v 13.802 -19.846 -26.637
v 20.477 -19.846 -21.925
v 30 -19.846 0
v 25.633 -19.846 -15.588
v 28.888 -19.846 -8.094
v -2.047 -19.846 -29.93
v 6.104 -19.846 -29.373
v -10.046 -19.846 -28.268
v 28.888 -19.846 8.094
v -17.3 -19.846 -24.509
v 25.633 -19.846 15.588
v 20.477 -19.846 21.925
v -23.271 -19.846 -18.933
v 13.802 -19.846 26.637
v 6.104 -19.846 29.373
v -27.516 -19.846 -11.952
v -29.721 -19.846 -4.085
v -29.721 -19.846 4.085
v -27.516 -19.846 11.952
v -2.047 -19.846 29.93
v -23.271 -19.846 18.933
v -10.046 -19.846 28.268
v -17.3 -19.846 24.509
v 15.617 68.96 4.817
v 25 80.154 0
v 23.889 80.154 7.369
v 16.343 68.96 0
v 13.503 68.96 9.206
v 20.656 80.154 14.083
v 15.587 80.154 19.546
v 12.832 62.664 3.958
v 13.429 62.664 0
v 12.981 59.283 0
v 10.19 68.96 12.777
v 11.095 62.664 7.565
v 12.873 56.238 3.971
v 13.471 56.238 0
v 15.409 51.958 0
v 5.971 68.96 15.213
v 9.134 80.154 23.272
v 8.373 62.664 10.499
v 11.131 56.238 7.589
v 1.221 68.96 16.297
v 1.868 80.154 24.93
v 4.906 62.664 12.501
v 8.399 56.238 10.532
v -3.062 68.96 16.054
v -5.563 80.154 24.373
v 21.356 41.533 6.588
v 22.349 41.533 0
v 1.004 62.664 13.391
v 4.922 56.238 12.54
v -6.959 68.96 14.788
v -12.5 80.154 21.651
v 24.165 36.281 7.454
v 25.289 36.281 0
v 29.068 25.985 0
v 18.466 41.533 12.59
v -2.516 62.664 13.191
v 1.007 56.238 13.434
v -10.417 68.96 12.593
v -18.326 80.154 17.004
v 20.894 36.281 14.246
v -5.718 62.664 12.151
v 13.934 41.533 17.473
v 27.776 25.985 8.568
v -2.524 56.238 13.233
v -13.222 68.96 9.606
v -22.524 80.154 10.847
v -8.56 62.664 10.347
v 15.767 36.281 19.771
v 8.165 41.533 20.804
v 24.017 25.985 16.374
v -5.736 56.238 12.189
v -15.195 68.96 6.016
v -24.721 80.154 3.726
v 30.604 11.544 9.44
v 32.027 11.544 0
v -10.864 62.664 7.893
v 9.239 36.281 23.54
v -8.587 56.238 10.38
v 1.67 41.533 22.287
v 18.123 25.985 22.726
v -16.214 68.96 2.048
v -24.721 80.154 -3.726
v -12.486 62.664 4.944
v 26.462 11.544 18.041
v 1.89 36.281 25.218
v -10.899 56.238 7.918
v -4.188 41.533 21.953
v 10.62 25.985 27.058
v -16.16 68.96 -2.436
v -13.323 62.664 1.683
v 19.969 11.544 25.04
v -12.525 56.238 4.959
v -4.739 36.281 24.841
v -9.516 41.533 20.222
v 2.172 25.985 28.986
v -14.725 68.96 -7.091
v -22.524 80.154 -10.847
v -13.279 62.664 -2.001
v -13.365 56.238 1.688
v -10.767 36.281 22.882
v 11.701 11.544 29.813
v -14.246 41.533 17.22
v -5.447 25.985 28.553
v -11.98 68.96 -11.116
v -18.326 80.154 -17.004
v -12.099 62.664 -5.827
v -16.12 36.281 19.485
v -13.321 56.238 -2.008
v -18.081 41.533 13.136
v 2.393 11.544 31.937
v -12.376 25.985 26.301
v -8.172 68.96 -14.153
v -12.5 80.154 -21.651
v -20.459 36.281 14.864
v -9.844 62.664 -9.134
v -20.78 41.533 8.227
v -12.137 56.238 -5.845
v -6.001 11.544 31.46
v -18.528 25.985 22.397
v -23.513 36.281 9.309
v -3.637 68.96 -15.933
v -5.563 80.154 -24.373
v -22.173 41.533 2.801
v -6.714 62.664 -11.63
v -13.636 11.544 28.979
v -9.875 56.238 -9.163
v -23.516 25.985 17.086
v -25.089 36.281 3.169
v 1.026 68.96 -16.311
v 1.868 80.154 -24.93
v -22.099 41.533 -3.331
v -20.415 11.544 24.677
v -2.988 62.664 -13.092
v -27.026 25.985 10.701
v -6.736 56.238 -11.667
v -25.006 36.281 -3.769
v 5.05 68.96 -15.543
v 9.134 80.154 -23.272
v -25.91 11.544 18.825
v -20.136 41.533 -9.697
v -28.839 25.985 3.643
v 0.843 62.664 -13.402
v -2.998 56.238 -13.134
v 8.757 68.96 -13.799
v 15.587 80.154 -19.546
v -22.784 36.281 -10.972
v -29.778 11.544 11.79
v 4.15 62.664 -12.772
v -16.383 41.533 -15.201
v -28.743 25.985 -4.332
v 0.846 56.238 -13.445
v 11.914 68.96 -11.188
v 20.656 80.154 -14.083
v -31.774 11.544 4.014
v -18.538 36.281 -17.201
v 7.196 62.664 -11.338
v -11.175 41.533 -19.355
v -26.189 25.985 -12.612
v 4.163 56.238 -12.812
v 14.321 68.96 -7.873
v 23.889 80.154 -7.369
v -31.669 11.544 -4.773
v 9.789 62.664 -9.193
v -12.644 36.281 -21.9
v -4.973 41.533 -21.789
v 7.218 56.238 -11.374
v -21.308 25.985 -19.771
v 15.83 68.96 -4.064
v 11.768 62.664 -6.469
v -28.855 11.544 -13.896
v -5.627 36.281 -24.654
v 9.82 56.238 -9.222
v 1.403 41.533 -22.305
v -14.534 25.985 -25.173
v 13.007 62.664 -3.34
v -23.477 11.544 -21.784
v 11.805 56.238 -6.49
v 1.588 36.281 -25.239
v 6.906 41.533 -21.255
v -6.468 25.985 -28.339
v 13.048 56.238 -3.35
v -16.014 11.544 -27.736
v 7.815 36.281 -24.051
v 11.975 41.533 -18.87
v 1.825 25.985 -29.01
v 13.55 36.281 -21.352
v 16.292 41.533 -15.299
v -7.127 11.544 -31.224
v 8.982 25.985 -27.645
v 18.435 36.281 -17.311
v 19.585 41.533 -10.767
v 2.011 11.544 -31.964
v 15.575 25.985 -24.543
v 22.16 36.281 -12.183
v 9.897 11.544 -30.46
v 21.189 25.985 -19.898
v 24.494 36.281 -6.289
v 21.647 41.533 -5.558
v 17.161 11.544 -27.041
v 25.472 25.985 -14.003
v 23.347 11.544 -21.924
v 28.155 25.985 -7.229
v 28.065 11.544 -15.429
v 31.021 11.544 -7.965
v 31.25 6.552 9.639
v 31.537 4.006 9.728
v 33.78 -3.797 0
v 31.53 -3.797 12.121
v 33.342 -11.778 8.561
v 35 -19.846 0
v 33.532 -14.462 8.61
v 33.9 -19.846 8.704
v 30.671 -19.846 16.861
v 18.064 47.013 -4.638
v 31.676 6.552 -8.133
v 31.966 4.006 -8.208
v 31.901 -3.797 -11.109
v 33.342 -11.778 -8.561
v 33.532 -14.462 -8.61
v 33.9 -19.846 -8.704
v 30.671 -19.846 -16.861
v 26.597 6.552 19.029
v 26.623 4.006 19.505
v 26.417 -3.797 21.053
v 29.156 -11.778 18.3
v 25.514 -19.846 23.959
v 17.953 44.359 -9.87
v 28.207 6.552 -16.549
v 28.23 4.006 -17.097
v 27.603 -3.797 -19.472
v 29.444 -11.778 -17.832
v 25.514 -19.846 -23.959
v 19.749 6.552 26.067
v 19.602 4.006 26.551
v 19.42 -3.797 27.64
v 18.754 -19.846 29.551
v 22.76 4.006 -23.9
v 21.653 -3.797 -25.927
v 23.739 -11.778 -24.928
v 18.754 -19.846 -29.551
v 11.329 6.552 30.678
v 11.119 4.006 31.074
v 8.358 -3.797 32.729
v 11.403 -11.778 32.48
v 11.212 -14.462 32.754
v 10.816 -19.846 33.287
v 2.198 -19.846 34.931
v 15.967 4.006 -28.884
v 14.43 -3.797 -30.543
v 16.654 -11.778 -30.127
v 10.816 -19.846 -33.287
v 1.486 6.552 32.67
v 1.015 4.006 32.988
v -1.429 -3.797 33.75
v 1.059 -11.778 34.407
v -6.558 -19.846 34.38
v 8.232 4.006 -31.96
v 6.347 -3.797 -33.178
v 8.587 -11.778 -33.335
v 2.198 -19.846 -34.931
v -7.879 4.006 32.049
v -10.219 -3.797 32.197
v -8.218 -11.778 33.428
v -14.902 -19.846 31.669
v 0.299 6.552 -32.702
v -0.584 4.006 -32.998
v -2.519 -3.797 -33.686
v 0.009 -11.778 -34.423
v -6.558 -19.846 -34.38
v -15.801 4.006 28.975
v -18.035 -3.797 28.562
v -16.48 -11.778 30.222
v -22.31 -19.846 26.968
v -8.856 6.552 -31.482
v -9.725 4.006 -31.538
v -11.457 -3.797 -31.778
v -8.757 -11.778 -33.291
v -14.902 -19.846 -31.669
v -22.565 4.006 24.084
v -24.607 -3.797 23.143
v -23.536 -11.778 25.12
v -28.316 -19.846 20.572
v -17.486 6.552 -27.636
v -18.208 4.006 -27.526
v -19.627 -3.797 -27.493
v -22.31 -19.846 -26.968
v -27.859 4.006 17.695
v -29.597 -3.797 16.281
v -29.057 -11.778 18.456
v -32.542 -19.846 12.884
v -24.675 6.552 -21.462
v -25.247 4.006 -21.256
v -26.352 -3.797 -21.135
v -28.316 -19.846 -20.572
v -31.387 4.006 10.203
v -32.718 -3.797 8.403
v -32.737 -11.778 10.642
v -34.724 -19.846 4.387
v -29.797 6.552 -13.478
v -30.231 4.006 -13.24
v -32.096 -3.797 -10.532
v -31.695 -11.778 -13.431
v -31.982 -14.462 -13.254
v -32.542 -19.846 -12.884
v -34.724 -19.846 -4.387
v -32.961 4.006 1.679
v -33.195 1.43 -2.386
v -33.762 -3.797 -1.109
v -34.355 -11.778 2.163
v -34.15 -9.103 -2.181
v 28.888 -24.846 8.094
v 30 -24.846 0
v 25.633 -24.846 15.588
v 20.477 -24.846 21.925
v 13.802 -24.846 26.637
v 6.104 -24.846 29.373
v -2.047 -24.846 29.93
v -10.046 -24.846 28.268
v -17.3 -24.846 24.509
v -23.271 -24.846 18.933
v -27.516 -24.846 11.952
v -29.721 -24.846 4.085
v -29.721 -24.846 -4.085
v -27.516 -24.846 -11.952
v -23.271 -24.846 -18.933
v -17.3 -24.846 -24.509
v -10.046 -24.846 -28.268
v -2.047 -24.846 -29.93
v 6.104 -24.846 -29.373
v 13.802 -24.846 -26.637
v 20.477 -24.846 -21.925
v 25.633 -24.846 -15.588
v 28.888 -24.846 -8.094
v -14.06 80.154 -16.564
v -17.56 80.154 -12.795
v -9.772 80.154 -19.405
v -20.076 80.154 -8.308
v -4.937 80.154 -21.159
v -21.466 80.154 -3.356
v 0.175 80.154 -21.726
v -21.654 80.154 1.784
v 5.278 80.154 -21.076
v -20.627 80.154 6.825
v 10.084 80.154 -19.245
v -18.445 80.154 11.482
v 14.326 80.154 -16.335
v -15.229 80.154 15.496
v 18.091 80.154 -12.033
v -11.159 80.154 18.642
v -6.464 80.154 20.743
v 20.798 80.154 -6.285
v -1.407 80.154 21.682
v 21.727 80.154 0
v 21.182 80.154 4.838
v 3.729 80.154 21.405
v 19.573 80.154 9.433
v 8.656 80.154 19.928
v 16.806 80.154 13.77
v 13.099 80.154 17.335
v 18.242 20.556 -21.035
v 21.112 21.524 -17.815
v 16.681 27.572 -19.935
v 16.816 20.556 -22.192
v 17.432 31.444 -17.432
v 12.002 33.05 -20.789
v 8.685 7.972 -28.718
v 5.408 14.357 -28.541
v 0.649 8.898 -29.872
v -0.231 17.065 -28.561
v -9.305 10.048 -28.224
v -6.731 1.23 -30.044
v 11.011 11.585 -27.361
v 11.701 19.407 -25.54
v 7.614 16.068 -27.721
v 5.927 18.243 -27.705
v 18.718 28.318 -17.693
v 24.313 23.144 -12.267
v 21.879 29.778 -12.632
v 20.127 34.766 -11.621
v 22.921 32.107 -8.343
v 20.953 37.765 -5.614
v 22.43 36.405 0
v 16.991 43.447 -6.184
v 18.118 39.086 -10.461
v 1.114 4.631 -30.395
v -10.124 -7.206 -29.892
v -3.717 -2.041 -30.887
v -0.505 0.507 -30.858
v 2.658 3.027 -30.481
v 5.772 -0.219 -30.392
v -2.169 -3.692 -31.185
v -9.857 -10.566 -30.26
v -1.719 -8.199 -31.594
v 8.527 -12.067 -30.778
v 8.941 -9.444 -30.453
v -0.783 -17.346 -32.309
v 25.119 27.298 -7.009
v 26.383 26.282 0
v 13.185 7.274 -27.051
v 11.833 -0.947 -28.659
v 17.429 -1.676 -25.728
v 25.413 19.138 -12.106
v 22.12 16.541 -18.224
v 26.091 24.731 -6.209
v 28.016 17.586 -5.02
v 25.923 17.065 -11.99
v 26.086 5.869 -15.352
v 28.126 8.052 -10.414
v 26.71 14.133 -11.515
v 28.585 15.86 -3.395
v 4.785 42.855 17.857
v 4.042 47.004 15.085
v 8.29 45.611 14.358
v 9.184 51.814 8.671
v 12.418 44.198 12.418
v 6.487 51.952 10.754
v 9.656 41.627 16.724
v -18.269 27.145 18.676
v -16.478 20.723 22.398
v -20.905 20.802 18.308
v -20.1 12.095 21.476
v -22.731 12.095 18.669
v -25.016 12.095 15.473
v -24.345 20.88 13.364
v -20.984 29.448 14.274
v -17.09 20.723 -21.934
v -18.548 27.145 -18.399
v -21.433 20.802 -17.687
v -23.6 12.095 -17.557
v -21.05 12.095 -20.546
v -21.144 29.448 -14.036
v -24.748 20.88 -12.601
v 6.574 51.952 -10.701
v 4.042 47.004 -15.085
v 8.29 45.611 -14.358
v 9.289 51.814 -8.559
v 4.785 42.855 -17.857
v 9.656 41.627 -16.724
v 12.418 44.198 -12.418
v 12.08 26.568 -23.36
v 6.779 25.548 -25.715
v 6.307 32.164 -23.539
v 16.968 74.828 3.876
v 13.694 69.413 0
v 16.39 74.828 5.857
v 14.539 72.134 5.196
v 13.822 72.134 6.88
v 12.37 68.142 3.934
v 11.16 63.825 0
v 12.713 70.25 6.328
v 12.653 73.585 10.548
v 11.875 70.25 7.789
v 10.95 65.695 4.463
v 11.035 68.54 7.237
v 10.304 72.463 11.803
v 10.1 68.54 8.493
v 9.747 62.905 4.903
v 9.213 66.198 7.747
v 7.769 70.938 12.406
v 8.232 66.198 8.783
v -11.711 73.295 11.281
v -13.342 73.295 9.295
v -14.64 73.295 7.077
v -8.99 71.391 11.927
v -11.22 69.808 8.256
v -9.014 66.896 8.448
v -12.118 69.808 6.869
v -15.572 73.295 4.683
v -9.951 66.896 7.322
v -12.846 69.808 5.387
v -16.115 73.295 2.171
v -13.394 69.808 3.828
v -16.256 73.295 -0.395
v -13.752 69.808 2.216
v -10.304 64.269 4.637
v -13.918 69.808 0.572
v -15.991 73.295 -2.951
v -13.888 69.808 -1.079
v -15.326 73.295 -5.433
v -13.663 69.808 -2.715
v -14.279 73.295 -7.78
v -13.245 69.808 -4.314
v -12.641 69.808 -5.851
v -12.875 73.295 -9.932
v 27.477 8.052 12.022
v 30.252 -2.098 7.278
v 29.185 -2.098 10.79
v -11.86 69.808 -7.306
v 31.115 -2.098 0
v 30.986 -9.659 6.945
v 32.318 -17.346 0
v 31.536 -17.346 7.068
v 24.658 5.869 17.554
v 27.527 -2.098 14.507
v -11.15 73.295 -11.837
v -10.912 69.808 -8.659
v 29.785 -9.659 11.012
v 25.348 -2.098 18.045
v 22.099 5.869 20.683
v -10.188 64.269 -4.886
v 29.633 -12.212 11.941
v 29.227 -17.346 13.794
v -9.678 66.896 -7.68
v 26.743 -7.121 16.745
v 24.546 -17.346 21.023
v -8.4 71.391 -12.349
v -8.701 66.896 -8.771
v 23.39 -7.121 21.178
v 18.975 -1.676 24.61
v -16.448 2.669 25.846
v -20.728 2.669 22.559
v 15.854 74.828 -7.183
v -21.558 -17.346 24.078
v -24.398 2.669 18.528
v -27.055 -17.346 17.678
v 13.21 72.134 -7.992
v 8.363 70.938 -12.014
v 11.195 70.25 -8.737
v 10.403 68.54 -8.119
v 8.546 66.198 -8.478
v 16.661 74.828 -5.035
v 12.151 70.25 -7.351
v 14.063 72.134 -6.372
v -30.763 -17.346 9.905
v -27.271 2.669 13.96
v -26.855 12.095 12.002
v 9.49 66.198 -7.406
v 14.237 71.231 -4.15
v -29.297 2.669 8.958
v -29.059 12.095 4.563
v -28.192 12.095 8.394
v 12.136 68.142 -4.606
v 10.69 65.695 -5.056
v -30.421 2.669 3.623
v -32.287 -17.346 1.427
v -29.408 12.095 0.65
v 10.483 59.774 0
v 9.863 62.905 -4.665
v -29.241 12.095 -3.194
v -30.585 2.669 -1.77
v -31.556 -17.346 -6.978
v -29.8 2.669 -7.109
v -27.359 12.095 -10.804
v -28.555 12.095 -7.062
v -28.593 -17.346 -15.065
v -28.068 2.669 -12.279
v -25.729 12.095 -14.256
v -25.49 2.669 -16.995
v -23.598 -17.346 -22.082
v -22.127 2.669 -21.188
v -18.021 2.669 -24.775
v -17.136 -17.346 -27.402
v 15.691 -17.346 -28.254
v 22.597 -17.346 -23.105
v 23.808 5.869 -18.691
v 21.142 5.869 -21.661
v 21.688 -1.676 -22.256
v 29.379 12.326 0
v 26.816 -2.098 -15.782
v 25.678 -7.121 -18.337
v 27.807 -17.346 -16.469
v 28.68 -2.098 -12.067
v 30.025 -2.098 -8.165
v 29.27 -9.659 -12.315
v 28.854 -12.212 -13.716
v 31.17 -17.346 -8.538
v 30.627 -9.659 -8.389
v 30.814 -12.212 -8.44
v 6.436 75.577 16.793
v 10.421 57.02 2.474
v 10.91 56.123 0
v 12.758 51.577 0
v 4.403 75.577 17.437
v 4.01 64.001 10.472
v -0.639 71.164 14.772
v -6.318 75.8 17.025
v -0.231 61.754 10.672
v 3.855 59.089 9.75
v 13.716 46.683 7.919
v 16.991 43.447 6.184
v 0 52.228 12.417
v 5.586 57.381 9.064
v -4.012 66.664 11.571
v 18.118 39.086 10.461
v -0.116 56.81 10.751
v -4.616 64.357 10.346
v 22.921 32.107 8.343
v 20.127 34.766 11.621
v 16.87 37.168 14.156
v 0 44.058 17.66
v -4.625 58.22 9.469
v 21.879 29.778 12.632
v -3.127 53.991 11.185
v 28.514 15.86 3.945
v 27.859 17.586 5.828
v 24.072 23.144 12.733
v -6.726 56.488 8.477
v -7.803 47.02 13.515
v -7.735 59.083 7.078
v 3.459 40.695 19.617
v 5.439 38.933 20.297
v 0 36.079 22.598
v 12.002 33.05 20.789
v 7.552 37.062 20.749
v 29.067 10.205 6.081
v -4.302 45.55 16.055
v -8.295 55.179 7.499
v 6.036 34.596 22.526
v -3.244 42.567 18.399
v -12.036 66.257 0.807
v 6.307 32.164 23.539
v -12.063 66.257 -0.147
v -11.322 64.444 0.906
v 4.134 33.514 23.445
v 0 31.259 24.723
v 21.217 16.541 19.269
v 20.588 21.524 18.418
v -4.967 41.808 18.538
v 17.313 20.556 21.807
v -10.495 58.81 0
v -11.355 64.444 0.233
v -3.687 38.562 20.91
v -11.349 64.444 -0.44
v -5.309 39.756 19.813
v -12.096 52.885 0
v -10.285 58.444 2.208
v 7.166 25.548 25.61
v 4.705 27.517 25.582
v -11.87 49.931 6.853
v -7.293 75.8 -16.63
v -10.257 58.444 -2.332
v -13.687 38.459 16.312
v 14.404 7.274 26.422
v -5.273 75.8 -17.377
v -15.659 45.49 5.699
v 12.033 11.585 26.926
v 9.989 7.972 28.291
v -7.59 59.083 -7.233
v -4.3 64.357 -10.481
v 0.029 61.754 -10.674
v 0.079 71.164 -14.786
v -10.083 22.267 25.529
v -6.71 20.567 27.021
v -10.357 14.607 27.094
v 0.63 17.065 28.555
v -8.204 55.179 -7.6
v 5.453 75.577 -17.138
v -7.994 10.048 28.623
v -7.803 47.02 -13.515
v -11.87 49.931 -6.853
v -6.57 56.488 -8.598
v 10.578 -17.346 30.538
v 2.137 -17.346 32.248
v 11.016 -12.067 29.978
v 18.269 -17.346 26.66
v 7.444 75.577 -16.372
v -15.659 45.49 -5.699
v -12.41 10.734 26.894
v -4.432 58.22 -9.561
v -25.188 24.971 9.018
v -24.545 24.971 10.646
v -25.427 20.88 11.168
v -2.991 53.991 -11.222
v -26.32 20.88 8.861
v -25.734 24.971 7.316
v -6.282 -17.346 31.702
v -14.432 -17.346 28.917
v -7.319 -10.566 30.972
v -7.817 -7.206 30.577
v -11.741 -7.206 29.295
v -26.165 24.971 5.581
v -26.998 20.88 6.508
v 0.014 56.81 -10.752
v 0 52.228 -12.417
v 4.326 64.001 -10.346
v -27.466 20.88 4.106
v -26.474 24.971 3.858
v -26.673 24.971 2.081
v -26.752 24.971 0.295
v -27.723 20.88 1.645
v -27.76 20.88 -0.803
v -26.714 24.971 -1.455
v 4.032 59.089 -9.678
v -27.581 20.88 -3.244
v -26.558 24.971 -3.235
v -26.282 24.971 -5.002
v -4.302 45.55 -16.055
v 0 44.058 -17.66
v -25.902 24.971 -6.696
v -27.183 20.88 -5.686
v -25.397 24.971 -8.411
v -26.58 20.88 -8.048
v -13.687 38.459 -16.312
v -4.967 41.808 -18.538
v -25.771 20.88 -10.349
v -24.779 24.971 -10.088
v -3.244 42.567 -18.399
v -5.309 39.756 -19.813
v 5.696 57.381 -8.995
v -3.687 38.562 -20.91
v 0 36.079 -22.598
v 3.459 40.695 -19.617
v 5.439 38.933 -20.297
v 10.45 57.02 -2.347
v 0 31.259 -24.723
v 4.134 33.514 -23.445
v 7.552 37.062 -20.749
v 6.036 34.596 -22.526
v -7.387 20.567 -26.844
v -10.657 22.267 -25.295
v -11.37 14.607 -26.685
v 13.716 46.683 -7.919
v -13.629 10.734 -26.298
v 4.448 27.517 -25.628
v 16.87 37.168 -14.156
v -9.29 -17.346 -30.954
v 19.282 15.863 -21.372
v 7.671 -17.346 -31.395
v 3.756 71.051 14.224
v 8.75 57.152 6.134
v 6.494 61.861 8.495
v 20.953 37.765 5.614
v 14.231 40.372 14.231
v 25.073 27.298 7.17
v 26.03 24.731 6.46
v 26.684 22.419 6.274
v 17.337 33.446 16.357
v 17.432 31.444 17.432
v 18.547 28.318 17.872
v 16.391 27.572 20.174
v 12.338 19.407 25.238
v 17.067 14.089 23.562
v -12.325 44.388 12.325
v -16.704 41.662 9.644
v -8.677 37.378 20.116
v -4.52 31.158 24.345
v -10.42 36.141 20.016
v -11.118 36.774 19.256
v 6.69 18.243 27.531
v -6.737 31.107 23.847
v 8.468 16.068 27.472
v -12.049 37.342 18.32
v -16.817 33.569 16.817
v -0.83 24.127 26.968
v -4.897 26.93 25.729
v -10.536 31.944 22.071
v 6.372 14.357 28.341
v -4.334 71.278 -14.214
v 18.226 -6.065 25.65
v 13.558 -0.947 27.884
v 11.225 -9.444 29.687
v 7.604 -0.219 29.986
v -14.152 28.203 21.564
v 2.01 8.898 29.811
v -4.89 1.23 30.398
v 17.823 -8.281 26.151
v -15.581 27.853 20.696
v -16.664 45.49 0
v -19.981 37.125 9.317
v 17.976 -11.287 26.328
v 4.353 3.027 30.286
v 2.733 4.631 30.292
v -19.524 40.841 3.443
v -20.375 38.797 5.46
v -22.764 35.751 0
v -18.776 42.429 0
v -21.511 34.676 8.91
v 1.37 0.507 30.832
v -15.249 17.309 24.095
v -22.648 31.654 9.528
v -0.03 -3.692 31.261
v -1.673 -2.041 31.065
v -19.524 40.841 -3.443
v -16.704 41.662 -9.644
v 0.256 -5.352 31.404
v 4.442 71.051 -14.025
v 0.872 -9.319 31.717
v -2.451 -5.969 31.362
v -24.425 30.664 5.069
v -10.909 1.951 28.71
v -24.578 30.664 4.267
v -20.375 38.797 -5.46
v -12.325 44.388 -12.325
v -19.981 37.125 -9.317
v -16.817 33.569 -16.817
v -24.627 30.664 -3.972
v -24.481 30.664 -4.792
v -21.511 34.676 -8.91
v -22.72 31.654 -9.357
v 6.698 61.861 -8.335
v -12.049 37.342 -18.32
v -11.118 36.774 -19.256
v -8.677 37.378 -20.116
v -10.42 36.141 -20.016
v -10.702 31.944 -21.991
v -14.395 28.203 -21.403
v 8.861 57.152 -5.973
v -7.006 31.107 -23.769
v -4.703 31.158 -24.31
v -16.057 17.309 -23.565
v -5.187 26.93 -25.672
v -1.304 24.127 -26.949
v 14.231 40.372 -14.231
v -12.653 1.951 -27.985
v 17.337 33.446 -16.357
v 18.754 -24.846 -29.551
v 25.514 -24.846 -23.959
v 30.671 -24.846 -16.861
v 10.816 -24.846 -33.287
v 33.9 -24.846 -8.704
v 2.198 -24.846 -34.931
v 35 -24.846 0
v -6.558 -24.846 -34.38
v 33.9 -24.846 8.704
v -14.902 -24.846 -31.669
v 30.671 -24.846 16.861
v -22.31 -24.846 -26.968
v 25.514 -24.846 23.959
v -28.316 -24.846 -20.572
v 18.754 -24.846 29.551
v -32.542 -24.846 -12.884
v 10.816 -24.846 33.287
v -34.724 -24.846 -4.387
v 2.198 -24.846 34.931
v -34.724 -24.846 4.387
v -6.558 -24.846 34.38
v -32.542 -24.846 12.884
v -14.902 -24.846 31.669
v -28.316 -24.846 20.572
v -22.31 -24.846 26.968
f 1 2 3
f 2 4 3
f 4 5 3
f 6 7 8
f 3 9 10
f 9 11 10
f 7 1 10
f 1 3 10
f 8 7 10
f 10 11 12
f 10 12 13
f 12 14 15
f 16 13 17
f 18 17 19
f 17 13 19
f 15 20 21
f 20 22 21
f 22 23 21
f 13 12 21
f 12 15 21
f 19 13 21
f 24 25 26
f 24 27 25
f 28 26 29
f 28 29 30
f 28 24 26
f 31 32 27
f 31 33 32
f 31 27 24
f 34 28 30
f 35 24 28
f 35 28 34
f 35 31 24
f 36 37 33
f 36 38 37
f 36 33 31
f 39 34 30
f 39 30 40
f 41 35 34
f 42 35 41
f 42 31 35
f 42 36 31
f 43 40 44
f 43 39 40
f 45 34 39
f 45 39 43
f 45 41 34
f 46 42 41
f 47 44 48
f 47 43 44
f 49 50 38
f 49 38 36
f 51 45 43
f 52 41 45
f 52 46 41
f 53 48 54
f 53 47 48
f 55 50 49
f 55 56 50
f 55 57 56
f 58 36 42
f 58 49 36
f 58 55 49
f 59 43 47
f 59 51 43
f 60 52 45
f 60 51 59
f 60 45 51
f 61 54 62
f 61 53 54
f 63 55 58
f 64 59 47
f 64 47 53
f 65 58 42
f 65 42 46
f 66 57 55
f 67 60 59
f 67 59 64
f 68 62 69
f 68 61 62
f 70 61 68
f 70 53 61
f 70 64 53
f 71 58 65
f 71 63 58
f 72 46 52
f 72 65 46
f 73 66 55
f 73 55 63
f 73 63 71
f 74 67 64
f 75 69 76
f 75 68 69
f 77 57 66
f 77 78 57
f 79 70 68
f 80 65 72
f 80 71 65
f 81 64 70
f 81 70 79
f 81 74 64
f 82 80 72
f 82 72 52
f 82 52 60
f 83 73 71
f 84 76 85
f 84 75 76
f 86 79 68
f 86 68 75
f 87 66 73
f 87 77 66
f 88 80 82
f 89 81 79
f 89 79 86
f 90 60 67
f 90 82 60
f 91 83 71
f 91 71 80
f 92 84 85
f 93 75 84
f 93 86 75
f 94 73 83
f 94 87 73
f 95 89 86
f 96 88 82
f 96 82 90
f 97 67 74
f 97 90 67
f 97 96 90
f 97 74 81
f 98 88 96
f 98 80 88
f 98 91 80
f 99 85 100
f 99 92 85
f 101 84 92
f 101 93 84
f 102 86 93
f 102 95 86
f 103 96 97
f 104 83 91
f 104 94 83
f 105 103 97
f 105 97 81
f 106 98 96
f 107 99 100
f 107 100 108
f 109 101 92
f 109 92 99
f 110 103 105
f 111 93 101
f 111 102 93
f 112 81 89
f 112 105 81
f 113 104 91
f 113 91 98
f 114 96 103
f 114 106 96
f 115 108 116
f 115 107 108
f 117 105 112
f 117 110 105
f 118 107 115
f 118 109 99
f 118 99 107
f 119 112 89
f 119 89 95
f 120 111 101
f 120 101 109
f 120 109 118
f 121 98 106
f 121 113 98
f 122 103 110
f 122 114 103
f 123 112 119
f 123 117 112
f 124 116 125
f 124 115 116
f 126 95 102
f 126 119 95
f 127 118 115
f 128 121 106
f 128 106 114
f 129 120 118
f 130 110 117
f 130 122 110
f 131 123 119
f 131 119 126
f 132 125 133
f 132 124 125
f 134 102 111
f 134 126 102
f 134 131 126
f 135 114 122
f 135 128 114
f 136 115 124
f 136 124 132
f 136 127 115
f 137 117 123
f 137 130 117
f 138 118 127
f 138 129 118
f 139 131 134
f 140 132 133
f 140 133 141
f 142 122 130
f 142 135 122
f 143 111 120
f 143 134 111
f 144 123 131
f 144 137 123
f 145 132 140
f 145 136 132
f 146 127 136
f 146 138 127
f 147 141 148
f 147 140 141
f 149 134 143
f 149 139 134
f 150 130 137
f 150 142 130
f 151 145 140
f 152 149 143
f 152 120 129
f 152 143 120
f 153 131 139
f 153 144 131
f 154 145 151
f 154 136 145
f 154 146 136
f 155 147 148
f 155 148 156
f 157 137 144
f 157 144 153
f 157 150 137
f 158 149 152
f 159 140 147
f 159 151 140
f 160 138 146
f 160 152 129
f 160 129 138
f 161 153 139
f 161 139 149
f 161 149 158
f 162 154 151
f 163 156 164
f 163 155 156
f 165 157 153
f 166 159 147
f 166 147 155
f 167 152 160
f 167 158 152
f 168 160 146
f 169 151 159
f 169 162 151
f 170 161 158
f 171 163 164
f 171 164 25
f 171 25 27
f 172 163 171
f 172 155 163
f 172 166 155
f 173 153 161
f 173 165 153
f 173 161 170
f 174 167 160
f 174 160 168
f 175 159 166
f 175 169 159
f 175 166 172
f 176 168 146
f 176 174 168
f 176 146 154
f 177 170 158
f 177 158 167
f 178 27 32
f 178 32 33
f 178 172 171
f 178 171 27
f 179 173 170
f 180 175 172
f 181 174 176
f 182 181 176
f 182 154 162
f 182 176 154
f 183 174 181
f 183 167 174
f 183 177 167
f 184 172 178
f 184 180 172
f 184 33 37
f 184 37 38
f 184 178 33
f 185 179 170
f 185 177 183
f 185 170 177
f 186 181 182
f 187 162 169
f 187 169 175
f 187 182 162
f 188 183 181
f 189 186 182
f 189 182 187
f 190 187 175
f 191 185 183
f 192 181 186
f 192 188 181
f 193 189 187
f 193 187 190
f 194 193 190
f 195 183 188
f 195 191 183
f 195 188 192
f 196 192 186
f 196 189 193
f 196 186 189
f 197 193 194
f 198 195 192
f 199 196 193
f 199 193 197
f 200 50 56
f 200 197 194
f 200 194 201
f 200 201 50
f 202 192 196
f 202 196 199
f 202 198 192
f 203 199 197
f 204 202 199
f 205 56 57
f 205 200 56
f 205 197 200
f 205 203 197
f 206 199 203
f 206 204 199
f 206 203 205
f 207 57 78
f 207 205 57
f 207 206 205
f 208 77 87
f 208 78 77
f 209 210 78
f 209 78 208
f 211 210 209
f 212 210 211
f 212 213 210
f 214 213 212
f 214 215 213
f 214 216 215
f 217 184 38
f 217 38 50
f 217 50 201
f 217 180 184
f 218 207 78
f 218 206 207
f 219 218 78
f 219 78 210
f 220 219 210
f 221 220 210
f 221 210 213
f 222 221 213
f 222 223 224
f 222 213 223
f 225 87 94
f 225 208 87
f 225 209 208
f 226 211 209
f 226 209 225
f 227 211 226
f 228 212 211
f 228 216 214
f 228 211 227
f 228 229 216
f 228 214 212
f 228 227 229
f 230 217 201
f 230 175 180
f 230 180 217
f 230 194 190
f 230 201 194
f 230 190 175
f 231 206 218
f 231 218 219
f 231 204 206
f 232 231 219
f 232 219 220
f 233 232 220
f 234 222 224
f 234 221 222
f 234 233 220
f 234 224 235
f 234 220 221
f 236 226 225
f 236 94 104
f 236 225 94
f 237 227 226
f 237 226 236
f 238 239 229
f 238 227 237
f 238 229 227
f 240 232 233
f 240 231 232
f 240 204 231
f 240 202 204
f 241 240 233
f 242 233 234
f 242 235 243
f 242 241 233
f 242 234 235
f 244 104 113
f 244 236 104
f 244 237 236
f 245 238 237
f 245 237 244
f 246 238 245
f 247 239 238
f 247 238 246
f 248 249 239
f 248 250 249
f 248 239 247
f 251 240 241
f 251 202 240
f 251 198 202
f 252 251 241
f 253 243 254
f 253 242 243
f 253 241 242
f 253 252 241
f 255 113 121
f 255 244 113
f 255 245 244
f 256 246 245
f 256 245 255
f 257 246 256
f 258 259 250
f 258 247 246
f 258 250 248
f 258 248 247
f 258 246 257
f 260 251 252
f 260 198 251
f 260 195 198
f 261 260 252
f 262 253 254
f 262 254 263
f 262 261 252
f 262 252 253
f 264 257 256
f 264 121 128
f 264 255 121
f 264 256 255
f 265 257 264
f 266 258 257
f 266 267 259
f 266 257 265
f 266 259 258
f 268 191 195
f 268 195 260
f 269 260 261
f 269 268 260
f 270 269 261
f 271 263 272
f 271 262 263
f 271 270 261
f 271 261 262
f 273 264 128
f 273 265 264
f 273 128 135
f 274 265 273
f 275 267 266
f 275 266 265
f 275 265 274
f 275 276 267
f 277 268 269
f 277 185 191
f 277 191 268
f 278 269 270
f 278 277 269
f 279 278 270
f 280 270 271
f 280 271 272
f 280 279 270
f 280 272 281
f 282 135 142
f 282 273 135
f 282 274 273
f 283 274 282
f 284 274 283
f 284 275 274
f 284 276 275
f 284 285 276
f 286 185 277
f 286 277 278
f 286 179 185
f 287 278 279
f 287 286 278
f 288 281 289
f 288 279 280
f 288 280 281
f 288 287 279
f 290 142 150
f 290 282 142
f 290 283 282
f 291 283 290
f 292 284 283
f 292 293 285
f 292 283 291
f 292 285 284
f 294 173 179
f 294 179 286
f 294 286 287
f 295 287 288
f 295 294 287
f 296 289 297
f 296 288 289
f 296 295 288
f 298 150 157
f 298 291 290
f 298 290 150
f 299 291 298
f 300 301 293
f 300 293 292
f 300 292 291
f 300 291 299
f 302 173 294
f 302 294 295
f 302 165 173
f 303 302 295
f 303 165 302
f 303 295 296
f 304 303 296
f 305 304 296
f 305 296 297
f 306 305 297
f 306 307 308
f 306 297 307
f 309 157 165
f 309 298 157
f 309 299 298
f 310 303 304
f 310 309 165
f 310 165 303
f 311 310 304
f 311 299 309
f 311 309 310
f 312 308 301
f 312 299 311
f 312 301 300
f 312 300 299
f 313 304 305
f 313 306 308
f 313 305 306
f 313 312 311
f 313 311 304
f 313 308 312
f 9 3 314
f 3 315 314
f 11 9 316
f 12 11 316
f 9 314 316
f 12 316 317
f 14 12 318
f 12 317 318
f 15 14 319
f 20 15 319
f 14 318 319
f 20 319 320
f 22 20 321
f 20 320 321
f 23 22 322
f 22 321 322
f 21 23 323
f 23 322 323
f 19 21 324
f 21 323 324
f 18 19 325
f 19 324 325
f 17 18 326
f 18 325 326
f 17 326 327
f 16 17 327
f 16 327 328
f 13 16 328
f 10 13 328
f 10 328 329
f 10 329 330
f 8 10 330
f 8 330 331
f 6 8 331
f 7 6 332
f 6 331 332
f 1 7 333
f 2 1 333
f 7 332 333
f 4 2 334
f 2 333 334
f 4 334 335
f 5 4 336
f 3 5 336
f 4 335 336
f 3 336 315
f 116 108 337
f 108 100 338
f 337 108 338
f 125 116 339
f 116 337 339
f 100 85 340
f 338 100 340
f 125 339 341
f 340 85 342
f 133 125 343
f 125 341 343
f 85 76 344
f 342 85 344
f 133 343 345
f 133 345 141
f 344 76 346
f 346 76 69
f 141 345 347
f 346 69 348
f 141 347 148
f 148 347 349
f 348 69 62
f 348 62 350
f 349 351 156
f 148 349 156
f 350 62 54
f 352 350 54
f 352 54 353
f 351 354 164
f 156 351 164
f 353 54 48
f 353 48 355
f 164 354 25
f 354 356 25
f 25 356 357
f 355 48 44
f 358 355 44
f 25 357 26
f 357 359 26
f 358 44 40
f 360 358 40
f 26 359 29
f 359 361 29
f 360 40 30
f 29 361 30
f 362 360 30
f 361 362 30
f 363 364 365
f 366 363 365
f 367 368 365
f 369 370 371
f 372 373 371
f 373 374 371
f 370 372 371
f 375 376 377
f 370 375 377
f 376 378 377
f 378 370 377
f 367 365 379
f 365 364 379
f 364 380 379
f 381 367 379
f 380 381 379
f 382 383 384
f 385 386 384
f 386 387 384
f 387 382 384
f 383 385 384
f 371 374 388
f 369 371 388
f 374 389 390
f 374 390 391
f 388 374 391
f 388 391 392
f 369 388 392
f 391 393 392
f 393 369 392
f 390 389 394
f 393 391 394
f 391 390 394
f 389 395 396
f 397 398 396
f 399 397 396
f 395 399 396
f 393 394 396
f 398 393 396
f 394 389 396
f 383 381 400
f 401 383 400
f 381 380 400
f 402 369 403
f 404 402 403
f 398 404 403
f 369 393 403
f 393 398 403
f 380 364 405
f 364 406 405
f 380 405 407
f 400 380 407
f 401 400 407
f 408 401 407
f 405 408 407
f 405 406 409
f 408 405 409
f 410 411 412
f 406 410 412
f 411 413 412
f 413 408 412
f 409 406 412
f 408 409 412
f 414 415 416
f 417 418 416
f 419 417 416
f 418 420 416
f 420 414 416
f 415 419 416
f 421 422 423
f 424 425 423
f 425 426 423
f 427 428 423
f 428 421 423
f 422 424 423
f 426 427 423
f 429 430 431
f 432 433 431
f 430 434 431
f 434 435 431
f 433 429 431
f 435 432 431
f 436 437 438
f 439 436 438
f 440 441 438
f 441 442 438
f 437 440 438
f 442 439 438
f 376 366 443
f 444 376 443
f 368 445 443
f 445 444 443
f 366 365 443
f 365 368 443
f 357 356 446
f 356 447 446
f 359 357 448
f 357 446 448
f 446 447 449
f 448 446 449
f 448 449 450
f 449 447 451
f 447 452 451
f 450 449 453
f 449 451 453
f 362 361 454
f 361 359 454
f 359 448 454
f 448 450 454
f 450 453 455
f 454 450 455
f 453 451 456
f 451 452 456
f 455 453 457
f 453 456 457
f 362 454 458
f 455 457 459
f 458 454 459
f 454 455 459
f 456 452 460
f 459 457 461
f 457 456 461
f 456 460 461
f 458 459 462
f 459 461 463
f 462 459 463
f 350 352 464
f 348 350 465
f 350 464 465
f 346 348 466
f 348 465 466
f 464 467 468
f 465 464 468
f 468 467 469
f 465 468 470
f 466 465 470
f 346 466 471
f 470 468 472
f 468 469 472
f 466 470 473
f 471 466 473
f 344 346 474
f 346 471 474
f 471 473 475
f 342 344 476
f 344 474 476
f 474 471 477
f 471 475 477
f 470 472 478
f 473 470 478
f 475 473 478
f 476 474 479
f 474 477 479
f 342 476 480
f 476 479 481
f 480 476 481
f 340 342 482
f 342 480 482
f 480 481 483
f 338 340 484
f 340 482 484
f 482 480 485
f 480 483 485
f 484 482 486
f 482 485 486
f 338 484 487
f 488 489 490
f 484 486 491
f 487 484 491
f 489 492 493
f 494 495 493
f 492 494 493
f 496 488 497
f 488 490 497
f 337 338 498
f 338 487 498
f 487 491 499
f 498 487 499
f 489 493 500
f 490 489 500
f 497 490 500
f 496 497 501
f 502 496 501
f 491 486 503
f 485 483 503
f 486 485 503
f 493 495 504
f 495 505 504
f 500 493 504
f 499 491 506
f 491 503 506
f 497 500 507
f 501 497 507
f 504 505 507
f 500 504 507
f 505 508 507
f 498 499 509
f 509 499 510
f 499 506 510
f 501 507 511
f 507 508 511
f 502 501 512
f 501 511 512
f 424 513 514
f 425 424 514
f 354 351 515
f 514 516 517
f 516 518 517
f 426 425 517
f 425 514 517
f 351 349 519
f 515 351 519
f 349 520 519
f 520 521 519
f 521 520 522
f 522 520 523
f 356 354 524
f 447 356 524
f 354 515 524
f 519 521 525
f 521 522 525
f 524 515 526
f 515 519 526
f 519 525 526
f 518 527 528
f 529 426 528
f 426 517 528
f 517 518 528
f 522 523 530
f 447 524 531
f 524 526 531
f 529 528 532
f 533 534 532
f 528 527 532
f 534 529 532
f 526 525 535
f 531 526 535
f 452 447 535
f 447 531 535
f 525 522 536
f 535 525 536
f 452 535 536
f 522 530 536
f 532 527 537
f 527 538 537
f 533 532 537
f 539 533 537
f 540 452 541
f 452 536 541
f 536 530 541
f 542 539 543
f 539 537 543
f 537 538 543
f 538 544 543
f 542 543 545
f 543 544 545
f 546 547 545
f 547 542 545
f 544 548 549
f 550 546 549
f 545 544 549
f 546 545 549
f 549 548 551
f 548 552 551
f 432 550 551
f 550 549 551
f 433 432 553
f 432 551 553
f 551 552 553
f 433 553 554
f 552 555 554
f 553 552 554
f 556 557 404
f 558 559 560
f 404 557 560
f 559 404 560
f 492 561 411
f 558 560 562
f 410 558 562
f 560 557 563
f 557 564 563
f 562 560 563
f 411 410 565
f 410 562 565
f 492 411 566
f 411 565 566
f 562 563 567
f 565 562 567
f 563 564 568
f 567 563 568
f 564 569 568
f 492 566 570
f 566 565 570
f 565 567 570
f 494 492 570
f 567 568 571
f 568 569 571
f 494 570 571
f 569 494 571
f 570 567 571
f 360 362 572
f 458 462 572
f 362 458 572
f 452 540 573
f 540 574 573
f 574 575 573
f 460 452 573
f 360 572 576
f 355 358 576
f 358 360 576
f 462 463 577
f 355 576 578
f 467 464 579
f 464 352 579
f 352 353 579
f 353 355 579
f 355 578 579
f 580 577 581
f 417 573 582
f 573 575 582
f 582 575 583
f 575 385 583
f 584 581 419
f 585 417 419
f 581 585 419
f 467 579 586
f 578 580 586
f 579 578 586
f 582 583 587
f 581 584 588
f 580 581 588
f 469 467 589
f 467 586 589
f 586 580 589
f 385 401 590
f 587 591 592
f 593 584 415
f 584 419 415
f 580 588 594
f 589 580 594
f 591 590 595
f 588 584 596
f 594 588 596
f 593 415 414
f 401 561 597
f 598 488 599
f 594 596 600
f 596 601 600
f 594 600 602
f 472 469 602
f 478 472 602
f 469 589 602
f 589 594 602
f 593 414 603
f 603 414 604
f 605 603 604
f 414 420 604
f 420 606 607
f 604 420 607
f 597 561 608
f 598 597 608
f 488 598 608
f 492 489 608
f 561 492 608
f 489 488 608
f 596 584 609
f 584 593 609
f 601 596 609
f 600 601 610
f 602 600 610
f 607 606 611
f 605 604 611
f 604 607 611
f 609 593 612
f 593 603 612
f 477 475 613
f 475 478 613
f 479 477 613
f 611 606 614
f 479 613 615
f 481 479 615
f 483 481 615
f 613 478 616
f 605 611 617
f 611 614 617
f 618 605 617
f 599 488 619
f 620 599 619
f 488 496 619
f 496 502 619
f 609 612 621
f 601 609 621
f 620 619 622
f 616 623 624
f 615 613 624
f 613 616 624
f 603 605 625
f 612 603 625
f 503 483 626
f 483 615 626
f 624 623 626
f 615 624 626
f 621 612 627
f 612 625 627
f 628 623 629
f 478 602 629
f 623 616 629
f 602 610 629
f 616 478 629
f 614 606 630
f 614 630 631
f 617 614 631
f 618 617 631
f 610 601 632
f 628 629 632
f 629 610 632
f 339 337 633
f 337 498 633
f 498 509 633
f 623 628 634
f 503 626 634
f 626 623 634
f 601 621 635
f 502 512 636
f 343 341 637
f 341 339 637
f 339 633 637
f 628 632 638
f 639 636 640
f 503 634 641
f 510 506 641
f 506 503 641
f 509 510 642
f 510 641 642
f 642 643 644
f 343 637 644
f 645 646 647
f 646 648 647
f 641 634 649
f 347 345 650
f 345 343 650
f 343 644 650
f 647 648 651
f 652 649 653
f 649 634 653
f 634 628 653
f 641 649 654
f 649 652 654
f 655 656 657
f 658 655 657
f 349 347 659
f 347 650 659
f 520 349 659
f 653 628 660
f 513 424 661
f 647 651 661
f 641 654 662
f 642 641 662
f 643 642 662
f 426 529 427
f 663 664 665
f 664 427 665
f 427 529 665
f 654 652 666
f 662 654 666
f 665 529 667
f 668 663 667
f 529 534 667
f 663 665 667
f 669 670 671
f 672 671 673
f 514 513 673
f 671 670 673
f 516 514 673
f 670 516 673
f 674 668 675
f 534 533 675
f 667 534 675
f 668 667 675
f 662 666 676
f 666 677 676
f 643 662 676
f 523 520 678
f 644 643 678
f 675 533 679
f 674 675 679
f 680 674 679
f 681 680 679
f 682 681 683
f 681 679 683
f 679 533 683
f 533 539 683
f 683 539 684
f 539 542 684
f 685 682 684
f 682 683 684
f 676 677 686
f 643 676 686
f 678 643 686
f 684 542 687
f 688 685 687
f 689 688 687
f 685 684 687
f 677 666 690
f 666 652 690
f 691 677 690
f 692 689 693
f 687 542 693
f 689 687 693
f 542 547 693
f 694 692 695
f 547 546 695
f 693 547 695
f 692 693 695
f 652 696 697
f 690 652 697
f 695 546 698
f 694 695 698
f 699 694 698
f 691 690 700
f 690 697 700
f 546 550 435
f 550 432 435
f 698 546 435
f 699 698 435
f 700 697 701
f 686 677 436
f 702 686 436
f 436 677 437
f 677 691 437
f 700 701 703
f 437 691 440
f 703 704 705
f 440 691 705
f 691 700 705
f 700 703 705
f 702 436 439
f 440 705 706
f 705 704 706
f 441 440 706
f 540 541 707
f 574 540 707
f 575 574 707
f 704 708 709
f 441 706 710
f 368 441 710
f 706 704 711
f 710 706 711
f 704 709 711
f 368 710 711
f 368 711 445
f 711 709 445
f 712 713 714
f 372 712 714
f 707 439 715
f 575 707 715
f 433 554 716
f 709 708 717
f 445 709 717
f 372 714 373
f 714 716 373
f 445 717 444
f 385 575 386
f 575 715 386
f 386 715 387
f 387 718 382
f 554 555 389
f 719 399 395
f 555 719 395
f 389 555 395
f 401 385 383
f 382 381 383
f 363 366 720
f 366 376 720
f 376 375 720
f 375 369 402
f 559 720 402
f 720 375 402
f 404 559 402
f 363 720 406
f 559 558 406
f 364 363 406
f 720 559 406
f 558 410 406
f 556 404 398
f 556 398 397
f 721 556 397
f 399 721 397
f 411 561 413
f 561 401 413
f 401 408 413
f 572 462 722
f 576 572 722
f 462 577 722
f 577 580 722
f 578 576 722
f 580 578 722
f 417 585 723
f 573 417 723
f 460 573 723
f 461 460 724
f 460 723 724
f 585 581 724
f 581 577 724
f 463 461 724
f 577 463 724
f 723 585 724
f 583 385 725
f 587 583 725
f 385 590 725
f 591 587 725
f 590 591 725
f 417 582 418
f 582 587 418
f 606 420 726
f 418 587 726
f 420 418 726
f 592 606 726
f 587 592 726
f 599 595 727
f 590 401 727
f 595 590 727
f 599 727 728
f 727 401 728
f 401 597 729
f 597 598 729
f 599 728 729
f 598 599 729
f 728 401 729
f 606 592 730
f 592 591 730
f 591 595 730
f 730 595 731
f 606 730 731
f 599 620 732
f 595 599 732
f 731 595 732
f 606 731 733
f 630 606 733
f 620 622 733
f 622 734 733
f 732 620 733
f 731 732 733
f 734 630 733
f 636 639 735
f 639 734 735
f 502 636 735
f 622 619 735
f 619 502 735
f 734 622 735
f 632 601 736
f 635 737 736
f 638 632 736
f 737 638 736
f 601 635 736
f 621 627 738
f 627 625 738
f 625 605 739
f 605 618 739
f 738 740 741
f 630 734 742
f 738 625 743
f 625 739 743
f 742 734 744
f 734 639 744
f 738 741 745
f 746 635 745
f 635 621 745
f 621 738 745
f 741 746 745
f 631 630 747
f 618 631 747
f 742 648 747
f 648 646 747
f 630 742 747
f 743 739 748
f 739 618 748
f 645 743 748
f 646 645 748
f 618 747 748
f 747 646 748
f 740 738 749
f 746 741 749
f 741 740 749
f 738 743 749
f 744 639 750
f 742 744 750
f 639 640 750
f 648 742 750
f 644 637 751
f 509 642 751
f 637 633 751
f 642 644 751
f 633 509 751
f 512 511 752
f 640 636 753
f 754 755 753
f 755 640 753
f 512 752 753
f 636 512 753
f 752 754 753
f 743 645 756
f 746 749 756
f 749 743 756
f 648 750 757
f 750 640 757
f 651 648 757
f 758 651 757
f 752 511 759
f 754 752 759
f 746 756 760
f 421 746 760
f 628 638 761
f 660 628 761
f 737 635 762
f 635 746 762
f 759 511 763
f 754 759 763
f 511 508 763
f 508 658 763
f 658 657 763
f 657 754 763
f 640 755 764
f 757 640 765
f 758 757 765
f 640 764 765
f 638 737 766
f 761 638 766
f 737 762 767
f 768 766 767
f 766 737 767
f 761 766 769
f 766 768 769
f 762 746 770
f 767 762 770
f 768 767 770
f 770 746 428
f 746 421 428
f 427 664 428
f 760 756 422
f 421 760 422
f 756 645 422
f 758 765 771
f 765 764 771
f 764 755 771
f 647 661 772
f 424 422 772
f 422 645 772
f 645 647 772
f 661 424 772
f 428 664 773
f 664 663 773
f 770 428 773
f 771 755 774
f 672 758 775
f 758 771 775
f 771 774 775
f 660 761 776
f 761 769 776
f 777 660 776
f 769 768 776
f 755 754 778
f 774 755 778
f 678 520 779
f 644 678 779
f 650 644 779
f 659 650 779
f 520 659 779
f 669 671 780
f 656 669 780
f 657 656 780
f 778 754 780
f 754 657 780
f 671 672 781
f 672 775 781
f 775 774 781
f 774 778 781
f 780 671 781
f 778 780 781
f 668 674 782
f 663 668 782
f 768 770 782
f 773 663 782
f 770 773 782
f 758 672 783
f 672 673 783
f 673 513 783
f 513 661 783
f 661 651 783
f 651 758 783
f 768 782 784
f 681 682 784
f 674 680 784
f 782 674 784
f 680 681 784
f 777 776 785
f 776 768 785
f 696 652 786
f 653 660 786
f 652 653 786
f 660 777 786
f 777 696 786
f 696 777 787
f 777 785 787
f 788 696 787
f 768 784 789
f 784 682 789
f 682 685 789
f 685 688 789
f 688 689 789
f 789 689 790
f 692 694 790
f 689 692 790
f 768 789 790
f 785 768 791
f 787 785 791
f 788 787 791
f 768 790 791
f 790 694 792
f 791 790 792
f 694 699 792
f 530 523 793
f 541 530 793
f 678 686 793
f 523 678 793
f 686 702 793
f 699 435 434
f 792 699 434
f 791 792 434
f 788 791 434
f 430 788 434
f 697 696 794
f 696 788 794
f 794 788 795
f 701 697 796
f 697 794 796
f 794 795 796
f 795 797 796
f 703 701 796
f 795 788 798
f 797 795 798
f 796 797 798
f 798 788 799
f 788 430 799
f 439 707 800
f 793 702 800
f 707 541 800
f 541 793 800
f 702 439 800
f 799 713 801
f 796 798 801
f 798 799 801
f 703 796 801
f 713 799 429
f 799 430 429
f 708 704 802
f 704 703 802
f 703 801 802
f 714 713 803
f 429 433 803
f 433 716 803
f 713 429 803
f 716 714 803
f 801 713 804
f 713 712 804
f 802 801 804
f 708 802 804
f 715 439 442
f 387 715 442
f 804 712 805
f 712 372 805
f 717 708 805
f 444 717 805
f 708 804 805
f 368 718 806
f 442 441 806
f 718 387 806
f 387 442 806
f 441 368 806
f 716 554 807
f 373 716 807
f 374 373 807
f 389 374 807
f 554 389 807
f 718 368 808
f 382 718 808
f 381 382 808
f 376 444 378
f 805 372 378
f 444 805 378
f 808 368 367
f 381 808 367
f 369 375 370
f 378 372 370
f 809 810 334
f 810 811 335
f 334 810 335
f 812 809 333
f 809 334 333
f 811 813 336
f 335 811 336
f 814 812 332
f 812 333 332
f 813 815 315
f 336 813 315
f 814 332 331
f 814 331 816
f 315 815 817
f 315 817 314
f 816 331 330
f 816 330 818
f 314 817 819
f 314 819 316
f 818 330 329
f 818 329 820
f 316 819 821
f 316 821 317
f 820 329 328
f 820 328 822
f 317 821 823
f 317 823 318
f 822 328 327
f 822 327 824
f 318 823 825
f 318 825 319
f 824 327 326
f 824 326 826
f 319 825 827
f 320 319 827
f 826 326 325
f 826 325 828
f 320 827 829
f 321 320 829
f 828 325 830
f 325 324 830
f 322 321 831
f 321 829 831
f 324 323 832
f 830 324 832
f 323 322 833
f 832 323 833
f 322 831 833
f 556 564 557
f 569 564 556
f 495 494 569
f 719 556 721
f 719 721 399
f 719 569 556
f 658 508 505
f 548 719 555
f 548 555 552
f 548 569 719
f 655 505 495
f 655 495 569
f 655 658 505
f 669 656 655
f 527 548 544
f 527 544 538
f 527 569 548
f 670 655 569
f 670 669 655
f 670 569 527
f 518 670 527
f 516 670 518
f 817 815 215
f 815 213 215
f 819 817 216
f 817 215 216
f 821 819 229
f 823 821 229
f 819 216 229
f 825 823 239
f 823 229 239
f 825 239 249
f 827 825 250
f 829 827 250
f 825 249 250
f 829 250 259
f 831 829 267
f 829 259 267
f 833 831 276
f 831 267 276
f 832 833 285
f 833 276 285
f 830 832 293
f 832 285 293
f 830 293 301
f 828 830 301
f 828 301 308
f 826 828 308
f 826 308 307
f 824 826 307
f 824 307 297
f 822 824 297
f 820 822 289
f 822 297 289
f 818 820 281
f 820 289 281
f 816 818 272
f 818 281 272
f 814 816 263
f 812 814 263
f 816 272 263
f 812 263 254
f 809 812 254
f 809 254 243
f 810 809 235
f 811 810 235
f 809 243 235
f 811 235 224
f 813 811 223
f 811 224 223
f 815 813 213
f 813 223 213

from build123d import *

# Parameters (mm, degrees)
F2_T = -2.5


with BuildPart() as f1:
    # F0 (on Top) → F1 (revolve)
    with BuildSketch(Plane.XY):
        with BuildLine():
            add(Edge.make_bspline(
                [(25, 80.1539123058), (18.8296563793, 72.8638140322), (6.3958253179, 58.1735705177), (31.0256389858, 36.9451326056), (33.5061450744, 1.5001976258), (35, -19.8460876942)],
                knots=[0, 0, 0, 0, 0.2815302014, 0.5673102145, 1, 1, 1, 1], degree=3))
            Line((25, 80.1539123058), (0, 80.1539123058))
            Line((0, 80.1539123058), (0, -19.8460876942))
            Line((0, -19.8460876942), (30, -19.8460876942))
            Line((30, -19.8460876942), (30, -24.8460876942))
            Line((30, -24.8460876942), (35, -24.8460876942))
            Line((35, -24.8460876942), (35, -19.8460876942))
        make_face()
    revolve(axis=Axis((0, 30.1539123058, 0), (0, -1, 0)))

    # F2
    f2_openings = [f1.faces().sort_by_distance(p)[0] for p in [
        (0, 80.153912, 0),
    ]]
    offset(amount=F2_T, openings=f2_openings, kind=Kind.INTERSECTION)


solid = f1.part
